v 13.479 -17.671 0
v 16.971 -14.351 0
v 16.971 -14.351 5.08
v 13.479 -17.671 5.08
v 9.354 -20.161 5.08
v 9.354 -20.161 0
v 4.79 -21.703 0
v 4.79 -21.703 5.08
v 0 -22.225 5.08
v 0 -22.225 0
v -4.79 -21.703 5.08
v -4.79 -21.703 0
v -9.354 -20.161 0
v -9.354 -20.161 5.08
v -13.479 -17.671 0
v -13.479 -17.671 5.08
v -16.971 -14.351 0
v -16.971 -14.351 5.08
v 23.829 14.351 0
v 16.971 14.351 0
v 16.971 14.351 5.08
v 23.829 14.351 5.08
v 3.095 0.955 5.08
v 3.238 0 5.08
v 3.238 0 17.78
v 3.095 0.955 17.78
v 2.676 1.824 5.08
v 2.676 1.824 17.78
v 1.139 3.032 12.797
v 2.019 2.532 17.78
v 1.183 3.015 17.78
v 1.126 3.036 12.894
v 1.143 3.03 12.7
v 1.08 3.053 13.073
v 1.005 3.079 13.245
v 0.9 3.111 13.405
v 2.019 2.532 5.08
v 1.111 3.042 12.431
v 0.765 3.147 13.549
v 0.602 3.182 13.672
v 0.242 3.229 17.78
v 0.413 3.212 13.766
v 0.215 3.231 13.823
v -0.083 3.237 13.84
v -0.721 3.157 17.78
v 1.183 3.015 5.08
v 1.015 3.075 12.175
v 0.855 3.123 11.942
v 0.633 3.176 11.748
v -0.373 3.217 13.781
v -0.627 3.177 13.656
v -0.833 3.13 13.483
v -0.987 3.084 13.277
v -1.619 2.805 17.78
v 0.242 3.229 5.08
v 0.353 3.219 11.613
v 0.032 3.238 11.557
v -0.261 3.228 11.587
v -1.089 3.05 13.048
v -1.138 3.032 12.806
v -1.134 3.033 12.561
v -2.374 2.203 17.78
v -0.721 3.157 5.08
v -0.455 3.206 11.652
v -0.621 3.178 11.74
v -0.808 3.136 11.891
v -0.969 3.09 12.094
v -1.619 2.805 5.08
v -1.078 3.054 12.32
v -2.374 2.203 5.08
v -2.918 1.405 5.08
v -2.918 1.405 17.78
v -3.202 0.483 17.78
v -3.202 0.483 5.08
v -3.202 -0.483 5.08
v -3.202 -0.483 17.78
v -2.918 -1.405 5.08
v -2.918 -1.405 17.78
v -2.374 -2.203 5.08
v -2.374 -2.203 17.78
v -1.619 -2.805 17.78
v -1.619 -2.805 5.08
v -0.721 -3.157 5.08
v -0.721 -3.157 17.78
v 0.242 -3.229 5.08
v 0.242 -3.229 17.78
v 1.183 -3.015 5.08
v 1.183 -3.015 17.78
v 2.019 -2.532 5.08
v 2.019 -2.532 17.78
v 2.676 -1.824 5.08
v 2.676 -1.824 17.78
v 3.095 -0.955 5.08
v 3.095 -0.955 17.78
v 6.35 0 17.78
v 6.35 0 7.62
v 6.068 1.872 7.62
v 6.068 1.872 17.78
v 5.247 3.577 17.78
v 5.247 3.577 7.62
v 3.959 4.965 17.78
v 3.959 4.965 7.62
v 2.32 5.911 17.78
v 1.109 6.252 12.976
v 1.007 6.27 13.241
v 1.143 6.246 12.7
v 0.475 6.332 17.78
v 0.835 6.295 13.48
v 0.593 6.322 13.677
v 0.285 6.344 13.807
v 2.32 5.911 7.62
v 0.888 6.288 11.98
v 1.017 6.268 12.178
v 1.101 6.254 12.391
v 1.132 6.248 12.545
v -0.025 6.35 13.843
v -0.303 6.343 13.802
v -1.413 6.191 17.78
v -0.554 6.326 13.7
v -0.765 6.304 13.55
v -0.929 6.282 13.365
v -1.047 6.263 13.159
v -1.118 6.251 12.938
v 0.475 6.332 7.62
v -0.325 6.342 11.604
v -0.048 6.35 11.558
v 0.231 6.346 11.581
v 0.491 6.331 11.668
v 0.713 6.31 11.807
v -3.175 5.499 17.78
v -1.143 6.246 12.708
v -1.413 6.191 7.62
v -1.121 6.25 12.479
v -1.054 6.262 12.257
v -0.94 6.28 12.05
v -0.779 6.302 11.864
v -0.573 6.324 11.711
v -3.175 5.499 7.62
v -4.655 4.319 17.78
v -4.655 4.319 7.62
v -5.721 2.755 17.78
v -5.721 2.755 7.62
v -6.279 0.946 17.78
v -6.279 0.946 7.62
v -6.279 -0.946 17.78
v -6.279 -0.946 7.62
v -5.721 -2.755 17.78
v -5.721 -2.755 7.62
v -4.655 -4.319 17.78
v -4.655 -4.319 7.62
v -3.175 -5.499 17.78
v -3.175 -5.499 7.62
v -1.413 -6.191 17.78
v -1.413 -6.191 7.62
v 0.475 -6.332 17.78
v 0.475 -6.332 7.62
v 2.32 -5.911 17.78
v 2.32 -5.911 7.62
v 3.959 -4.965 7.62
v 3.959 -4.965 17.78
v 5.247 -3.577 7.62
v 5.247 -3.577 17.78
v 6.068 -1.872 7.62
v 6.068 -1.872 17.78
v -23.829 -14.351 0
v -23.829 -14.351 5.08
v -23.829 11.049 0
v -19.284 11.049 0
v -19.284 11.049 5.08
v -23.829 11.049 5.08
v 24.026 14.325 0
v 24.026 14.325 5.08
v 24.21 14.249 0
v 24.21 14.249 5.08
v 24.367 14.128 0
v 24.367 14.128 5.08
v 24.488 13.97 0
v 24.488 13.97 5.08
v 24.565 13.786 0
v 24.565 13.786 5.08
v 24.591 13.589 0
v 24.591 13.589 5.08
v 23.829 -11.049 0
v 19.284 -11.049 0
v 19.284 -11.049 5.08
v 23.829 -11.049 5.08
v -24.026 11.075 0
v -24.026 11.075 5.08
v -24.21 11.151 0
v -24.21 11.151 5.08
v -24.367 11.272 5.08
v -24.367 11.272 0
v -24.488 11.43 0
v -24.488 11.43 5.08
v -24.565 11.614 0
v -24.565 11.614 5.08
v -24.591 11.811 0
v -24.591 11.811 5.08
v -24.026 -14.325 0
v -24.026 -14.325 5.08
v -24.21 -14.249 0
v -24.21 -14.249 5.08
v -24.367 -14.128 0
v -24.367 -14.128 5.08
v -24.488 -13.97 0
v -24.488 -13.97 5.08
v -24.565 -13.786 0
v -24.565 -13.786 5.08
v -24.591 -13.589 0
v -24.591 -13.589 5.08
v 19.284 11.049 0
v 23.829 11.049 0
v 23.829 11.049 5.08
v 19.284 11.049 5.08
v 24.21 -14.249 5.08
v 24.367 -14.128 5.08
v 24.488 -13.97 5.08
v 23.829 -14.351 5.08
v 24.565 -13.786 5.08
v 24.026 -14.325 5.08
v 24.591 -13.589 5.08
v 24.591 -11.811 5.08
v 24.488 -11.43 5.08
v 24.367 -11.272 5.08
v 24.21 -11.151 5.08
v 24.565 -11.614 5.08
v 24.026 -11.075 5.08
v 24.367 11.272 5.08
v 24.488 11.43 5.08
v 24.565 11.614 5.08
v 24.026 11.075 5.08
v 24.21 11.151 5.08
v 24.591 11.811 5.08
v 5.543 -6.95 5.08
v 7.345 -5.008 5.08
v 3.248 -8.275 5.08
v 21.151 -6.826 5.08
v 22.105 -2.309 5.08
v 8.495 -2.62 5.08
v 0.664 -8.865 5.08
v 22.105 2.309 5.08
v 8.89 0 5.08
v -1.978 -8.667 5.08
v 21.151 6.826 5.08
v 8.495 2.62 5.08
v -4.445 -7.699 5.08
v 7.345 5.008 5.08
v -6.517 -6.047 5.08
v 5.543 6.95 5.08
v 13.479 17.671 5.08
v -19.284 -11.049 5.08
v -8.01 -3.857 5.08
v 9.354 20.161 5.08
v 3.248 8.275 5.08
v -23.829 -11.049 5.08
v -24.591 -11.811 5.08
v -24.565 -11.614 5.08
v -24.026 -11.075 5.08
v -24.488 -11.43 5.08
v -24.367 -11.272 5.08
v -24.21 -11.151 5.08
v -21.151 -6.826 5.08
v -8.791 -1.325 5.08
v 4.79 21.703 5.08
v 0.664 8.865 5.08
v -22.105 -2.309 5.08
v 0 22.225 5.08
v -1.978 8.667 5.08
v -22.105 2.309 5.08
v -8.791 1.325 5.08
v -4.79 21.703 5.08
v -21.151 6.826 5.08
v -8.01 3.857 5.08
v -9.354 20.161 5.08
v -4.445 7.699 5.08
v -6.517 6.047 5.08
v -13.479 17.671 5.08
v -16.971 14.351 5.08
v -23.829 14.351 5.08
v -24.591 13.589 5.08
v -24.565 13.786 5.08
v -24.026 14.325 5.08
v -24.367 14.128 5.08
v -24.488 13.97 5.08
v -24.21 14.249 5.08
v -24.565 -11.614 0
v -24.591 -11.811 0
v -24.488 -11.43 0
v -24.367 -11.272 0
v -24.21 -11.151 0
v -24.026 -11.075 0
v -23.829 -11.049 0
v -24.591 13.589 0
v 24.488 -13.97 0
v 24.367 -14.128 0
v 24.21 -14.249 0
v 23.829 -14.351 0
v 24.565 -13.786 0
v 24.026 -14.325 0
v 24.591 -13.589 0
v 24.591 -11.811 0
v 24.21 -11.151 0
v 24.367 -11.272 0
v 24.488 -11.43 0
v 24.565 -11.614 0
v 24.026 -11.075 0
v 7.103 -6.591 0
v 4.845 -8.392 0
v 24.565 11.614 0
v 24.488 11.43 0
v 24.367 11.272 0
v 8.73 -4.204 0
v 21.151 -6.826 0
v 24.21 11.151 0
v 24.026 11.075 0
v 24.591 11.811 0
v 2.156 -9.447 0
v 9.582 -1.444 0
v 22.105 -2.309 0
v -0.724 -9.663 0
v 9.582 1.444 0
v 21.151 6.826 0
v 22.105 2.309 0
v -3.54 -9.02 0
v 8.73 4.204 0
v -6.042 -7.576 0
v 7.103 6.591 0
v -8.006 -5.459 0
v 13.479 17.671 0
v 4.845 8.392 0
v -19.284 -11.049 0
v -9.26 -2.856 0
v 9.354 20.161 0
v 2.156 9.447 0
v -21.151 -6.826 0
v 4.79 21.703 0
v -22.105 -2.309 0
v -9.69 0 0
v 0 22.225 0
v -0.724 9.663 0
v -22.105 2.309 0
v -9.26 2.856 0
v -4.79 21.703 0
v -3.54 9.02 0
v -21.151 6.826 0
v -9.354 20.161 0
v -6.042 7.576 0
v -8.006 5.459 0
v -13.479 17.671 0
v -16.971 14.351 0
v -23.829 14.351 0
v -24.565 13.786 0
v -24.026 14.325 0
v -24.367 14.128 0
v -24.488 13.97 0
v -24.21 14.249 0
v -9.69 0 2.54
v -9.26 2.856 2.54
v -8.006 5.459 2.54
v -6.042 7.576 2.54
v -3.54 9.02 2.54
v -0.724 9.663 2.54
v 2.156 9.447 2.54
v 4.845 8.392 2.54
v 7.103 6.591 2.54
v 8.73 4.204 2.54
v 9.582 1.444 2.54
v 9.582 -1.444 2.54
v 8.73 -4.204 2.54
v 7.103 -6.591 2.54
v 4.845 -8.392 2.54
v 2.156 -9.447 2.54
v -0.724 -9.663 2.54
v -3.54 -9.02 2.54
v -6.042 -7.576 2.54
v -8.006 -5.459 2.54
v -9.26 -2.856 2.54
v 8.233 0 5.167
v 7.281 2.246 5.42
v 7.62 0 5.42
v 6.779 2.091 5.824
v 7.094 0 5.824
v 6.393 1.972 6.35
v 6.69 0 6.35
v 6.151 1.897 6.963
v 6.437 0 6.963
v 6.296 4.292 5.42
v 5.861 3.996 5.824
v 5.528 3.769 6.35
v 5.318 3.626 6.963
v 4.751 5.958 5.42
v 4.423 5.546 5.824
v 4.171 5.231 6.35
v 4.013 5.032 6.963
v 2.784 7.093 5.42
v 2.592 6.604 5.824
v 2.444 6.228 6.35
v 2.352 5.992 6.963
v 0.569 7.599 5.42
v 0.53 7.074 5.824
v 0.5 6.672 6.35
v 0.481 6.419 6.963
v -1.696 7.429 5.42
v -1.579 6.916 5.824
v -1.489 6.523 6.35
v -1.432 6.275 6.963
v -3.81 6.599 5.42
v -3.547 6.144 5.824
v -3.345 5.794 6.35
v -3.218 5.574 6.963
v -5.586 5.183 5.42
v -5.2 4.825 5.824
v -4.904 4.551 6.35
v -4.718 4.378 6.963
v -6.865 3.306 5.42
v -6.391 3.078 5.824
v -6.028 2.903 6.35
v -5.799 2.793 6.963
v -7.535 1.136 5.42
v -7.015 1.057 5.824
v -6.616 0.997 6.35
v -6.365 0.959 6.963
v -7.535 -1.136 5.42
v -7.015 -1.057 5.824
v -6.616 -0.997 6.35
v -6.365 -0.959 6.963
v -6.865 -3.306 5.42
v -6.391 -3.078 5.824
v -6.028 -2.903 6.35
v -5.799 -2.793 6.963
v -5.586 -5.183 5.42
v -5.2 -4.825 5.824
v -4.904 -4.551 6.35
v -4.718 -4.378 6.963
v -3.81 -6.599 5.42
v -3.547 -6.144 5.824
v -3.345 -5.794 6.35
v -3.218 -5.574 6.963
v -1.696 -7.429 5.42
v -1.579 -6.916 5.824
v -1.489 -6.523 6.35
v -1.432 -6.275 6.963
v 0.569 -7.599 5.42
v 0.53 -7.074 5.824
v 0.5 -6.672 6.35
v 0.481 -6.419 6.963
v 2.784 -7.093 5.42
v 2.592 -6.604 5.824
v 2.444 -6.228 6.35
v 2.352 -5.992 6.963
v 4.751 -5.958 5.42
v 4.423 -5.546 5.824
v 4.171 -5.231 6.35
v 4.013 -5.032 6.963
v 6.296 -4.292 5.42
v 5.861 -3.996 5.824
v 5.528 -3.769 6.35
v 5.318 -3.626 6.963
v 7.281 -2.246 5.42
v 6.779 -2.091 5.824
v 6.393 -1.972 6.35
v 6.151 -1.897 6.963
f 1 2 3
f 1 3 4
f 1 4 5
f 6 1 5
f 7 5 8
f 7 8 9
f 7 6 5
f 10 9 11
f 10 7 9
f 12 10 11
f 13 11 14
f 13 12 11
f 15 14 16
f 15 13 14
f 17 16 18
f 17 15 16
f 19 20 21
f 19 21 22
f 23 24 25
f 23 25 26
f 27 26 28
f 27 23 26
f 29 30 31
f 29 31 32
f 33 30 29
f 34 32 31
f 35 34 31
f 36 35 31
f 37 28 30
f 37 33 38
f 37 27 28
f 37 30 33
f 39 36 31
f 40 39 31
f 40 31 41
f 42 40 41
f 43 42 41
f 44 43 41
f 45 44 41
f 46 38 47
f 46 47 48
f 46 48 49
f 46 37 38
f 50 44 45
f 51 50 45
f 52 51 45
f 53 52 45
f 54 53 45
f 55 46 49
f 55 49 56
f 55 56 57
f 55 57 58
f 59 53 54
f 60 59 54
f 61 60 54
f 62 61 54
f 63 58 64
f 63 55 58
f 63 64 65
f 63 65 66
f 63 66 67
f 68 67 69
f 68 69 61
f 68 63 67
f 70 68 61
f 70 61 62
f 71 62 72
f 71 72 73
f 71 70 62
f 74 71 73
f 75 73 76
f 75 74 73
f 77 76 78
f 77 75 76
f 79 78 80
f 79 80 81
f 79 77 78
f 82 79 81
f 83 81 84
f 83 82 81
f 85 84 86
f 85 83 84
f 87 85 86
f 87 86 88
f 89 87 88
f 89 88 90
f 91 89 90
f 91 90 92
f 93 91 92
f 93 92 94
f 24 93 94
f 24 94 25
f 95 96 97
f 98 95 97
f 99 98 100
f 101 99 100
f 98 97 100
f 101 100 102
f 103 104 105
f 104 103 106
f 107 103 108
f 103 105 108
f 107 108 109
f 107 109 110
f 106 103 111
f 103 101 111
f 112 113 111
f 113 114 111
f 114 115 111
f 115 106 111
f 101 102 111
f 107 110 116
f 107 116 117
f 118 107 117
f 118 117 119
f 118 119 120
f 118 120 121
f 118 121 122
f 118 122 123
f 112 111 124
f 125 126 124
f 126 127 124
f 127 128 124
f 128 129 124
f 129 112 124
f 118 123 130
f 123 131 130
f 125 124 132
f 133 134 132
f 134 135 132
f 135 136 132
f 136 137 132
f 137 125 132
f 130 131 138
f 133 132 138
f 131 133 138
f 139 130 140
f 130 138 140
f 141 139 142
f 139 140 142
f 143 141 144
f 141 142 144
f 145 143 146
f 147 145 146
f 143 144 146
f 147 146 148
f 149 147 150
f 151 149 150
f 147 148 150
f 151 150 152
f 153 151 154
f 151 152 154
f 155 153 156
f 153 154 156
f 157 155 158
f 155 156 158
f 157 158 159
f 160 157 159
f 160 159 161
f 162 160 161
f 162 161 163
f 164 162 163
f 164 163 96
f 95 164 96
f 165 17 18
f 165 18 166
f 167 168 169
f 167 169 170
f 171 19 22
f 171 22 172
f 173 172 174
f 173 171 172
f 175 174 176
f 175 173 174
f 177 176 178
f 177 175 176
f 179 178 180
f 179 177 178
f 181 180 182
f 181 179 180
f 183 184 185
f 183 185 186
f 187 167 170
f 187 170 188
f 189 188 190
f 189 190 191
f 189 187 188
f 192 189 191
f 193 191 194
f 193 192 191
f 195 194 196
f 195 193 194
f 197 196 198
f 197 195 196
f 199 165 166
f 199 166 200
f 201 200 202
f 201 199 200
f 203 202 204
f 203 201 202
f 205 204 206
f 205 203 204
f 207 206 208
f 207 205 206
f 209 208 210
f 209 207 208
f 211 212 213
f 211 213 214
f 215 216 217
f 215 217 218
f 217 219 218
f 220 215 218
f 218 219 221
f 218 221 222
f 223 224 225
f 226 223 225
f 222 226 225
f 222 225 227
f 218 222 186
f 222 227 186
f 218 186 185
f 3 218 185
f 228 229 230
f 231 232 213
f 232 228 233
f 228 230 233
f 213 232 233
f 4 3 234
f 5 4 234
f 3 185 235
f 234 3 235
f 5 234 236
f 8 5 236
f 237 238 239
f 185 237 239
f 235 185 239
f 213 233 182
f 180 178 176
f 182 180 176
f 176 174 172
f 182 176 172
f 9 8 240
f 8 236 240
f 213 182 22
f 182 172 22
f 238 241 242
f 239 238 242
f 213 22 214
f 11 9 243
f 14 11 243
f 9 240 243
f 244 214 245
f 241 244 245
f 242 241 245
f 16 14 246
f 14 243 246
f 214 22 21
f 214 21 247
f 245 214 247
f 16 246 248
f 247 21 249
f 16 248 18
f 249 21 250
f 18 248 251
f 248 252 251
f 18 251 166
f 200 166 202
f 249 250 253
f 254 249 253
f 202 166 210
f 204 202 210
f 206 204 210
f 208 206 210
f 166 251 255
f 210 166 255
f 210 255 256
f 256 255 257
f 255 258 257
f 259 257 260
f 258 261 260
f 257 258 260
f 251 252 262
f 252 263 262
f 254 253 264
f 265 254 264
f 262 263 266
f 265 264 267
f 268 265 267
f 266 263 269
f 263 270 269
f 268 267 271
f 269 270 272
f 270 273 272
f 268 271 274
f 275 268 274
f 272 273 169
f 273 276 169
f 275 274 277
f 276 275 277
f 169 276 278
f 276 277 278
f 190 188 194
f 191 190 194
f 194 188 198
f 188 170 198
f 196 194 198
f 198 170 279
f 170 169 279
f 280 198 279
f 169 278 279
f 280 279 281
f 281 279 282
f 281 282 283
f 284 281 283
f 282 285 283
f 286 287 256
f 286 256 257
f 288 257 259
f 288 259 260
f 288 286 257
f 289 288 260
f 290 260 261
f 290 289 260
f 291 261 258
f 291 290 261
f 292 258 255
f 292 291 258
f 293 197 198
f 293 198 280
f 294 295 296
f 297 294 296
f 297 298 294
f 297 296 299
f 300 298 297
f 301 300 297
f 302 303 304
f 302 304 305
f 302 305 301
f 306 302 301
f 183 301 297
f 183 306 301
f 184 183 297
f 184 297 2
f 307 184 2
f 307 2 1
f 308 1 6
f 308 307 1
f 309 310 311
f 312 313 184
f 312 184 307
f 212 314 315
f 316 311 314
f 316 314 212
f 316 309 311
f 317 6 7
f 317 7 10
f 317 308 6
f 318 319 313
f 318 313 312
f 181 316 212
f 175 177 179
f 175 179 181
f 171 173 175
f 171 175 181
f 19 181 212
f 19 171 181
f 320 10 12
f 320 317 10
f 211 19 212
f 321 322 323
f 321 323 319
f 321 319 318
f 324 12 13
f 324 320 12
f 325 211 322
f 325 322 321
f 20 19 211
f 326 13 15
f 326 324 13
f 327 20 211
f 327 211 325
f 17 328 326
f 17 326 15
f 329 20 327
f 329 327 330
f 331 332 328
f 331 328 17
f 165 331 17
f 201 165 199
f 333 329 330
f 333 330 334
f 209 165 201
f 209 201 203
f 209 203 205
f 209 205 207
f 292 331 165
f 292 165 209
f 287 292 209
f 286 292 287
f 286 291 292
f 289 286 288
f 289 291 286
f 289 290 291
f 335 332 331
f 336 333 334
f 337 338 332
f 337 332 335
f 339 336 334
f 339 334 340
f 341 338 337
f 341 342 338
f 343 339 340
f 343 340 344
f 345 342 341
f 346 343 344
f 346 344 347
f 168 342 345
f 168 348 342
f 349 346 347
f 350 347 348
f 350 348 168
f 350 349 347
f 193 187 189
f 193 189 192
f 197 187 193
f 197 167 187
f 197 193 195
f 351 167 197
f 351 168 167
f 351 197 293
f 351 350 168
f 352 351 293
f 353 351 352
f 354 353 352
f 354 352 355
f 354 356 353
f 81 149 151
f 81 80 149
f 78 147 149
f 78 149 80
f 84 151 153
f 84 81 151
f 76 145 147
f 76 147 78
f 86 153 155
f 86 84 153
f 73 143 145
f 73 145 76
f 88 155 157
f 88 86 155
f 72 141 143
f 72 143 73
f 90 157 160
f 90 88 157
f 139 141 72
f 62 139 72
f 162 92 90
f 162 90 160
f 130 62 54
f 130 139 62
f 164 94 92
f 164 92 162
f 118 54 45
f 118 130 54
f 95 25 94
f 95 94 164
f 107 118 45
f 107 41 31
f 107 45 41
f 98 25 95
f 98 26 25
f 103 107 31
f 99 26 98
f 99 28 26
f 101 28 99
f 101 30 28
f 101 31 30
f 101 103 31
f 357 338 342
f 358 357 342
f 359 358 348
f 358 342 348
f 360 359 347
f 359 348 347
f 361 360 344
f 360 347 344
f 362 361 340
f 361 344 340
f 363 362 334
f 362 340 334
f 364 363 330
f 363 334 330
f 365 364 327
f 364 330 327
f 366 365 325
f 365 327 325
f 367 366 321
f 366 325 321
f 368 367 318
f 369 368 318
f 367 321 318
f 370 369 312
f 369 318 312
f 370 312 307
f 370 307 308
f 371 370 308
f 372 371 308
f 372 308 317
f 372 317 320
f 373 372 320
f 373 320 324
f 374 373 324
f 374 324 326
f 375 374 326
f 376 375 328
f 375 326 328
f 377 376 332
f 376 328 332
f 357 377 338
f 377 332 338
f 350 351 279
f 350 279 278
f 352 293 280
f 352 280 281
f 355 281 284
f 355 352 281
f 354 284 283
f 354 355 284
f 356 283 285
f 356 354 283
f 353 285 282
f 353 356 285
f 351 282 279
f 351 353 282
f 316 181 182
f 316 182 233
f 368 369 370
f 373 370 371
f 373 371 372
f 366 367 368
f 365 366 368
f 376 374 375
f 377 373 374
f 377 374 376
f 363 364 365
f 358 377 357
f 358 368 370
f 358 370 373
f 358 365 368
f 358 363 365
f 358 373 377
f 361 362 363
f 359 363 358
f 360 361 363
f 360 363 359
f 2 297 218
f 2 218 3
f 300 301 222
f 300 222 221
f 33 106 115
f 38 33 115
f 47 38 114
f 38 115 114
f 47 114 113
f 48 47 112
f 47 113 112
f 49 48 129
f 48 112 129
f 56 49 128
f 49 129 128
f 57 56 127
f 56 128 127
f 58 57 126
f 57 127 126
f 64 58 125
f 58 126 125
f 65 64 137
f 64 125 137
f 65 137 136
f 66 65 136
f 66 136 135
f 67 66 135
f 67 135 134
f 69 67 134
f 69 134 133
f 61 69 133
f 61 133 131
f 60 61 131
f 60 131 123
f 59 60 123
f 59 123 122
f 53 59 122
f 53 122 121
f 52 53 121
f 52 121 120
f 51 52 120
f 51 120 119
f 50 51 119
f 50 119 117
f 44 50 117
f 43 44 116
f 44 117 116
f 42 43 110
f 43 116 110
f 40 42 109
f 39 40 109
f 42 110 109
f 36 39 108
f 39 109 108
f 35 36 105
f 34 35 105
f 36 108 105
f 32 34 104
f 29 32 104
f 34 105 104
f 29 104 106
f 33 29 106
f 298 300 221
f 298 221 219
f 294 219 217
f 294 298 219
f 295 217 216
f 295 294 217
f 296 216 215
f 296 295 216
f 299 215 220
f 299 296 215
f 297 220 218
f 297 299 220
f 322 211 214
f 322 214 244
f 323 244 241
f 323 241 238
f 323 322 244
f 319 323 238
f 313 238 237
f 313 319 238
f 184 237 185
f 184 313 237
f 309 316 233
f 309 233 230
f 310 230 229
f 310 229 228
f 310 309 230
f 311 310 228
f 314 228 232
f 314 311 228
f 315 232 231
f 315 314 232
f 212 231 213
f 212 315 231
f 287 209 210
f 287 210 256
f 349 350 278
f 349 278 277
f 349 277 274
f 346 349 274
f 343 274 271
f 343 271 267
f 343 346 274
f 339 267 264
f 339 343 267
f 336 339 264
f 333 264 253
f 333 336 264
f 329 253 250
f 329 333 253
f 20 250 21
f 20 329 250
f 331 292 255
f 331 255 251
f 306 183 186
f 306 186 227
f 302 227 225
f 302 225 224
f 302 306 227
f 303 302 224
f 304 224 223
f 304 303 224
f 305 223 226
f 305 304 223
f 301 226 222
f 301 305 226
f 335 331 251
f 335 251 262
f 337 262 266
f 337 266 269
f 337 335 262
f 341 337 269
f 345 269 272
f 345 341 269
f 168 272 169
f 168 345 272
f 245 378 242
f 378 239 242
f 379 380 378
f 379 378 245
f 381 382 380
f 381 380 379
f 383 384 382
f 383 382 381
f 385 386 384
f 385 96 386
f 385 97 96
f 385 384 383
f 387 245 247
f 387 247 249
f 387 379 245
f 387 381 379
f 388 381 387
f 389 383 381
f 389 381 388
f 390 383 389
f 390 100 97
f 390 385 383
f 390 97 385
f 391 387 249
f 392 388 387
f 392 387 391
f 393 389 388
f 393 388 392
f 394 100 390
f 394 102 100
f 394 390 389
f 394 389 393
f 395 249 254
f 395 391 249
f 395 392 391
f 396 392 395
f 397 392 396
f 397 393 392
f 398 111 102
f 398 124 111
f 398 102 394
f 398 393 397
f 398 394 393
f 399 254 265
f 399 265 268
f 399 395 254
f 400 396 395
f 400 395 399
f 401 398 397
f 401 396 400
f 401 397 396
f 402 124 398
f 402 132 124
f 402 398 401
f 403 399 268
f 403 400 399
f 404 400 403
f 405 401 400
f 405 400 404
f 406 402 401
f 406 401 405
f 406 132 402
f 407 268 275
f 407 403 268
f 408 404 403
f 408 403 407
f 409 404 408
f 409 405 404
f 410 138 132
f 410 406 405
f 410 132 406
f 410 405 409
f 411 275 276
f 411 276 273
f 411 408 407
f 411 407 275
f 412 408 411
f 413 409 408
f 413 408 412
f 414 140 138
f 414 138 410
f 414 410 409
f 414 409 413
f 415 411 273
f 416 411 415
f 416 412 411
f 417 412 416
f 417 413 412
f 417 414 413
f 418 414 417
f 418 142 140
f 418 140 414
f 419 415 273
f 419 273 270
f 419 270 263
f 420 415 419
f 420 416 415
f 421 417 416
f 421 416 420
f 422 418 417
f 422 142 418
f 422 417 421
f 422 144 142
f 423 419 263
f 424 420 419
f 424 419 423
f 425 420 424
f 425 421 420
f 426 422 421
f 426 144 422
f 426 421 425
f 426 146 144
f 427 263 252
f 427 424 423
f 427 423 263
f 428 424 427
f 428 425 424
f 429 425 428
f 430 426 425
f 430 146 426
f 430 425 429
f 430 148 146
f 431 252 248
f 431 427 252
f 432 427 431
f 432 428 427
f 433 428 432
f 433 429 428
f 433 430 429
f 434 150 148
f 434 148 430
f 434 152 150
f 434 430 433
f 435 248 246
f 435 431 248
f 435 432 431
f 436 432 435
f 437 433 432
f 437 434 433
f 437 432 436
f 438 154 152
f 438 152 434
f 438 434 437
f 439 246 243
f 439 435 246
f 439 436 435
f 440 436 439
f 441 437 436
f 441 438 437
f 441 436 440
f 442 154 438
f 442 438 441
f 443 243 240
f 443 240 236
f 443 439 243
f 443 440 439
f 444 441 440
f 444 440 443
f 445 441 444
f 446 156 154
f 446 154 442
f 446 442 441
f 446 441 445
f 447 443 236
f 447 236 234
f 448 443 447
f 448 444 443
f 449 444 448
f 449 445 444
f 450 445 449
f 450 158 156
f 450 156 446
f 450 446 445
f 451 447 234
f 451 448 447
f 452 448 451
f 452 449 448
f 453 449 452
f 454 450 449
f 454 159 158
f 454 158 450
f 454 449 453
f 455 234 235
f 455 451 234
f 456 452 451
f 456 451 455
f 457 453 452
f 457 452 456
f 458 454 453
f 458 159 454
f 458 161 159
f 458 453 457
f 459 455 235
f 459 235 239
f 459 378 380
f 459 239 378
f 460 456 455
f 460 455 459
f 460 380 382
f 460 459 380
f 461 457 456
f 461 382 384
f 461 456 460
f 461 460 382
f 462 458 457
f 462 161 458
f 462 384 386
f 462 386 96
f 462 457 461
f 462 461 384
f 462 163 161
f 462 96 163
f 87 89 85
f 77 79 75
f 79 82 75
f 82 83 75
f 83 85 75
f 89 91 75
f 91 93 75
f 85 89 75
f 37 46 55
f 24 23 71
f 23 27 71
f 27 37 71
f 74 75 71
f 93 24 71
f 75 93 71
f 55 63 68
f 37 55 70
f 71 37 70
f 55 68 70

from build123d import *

# Parameters (mm, degrees)
BOSS_EXTRUDE1_DEPTH = 5.08
SKETCH5_R           = 9.6901
CUT_EXTRUDE2_DEPTH  = 2.54
SKETCH6_R           = 6.35
SKETCH6_R_2         = 3.2385
BOSS_EXTRUDE4_DEPTH = 12.7
FILLET1_R           = 2.54
SKETCH8_R           = 1.143
CUT_EXTRUDE3_DEPTH  = 7.62


with BuildPart() as part:
    # Sketch1 → Boss-Extrude1 (new body)
    with BuildSketch(Plane.XY):
        with BuildLine():
            Line((-23.828545778, 14.351), (-16.970545778, 14.351))
            ThreePointArc((-16.970545778, 14.351), (0, 22.225), (16.970545778, 14.351))
            Line((16.970545778, 14.351), (23.828545778, 14.351))
            ThreePointArc((23.828545778, 14.351), (24.367361145, 14.127815367), (24.590545778, 13.589))
            Line((24.590545778, 13.589), (24.590545778, 11.811))
            ThreePointArc((24.590545778, 11.811), (24.367361145, 11.272184633), (23.828545778, 11.049))
            Line((23.828545778, 11.049), (19.283936942, 11.049))
            ThreePointArc((19.283936942, 11.049), (22.225, 0), (19.283936942, -11.049))
            Line((19.283936942, -11.049), (23.828545778, -11.049))
            ThreePointArc((23.828545778, -11.049), (24.367361145, -11.272184633), (24.590545778, -11.811))
            Line((24.590545778, -11.811), (24.590545778, -13.589))
            ThreePointArc((24.590545778, -13.589), (24.367361145, -14.127815367), (23.828545778, -14.351))
            Line((23.828545778, -14.351), (16.970545778, -14.351))
            ThreePointArc((16.970545778, -14.351), (0, -22.225), (-16.970545778, -14.351))
            Line((-16.970545778, -14.351), (-23.828545778, -14.351))
            ThreePointArc((-23.828545778, -14.351), (-24.367361145, -14.127815367), (-24.590545778, -13.589))
            Line((-24.590545778, -13.589), (-24.590545778, -11.811))
            ThreePointArc((-24.590545778, -11.811), (-24.367361145, -11.272184633), (-23.828545778, -11.049))
            Line((-23.828545778, -11.049), (-19.283936942, -11.049))
            ThreePointArc((-19.283936942, -11.049), (-22.225, 0), (-19.283936942, 11.049))
            Line((-19.283936942, 11.049), (-23.828545778, 11.049))
            ThreePointArc((-23.828545778, 11.049), (-24.367361145, 11.272184633), (-24.590545778, 11.811))
            Line((-24.590545778, 11.811), (-24.590545778, 13.589))
            ThreePointArc((-24.590545778, 13.589), (-24.367361145, 14.127815367), (-23.828545778, 14.351))
        make_face()
    extrude(amount=BOSS_EXTRUDE1_DEPTH)

    # Sketch5 → Cut-Extrude2 (cut)
    with BuildSketch(Plane(origin=(0, 0, 0), x_dir=(-1, 0, 0), z_dir=(0, 0, -1))):
        Circle(SKETCH5_R)
    extrude(amount=-CUT_EXTRUDE2_DEPTH, mode=Mode.SUBTRACT)

    # Sketch6 → Boss-Extrude4 (add)
    with BuildSketch(Plane.XY.offset(5.08)):
        Circle(SKETCH6_R)
        Circle(SKETCH6_R_2, mode=Mode.SUBTRACT)
    extrude(amount=BOSS_EXTRUDE4_DEPTH)

    # Fillet1
    fillet1_edges = [part.edges().sort_by_distance(p)[0] for p in [
        (-6.35, 0, 5.08),
    ]]
    fillet(fillet1_edges, radius=FILLET1_R)

    # Sketch8 → Cut-Extrude3 (cut)
    with BuildSketch(Plane(origin=(0, 6.35, 0), x_dir=(1, 0, 0), z_dir=(0, 1, 0))):
        with Locations((0, -12.7)):
            Circle(SKETCH8_R)
    extrude(amount=-CUT_EXTRUDE3_DEPTH, mode=Mode.SUBTRACT)


solid = part.part
